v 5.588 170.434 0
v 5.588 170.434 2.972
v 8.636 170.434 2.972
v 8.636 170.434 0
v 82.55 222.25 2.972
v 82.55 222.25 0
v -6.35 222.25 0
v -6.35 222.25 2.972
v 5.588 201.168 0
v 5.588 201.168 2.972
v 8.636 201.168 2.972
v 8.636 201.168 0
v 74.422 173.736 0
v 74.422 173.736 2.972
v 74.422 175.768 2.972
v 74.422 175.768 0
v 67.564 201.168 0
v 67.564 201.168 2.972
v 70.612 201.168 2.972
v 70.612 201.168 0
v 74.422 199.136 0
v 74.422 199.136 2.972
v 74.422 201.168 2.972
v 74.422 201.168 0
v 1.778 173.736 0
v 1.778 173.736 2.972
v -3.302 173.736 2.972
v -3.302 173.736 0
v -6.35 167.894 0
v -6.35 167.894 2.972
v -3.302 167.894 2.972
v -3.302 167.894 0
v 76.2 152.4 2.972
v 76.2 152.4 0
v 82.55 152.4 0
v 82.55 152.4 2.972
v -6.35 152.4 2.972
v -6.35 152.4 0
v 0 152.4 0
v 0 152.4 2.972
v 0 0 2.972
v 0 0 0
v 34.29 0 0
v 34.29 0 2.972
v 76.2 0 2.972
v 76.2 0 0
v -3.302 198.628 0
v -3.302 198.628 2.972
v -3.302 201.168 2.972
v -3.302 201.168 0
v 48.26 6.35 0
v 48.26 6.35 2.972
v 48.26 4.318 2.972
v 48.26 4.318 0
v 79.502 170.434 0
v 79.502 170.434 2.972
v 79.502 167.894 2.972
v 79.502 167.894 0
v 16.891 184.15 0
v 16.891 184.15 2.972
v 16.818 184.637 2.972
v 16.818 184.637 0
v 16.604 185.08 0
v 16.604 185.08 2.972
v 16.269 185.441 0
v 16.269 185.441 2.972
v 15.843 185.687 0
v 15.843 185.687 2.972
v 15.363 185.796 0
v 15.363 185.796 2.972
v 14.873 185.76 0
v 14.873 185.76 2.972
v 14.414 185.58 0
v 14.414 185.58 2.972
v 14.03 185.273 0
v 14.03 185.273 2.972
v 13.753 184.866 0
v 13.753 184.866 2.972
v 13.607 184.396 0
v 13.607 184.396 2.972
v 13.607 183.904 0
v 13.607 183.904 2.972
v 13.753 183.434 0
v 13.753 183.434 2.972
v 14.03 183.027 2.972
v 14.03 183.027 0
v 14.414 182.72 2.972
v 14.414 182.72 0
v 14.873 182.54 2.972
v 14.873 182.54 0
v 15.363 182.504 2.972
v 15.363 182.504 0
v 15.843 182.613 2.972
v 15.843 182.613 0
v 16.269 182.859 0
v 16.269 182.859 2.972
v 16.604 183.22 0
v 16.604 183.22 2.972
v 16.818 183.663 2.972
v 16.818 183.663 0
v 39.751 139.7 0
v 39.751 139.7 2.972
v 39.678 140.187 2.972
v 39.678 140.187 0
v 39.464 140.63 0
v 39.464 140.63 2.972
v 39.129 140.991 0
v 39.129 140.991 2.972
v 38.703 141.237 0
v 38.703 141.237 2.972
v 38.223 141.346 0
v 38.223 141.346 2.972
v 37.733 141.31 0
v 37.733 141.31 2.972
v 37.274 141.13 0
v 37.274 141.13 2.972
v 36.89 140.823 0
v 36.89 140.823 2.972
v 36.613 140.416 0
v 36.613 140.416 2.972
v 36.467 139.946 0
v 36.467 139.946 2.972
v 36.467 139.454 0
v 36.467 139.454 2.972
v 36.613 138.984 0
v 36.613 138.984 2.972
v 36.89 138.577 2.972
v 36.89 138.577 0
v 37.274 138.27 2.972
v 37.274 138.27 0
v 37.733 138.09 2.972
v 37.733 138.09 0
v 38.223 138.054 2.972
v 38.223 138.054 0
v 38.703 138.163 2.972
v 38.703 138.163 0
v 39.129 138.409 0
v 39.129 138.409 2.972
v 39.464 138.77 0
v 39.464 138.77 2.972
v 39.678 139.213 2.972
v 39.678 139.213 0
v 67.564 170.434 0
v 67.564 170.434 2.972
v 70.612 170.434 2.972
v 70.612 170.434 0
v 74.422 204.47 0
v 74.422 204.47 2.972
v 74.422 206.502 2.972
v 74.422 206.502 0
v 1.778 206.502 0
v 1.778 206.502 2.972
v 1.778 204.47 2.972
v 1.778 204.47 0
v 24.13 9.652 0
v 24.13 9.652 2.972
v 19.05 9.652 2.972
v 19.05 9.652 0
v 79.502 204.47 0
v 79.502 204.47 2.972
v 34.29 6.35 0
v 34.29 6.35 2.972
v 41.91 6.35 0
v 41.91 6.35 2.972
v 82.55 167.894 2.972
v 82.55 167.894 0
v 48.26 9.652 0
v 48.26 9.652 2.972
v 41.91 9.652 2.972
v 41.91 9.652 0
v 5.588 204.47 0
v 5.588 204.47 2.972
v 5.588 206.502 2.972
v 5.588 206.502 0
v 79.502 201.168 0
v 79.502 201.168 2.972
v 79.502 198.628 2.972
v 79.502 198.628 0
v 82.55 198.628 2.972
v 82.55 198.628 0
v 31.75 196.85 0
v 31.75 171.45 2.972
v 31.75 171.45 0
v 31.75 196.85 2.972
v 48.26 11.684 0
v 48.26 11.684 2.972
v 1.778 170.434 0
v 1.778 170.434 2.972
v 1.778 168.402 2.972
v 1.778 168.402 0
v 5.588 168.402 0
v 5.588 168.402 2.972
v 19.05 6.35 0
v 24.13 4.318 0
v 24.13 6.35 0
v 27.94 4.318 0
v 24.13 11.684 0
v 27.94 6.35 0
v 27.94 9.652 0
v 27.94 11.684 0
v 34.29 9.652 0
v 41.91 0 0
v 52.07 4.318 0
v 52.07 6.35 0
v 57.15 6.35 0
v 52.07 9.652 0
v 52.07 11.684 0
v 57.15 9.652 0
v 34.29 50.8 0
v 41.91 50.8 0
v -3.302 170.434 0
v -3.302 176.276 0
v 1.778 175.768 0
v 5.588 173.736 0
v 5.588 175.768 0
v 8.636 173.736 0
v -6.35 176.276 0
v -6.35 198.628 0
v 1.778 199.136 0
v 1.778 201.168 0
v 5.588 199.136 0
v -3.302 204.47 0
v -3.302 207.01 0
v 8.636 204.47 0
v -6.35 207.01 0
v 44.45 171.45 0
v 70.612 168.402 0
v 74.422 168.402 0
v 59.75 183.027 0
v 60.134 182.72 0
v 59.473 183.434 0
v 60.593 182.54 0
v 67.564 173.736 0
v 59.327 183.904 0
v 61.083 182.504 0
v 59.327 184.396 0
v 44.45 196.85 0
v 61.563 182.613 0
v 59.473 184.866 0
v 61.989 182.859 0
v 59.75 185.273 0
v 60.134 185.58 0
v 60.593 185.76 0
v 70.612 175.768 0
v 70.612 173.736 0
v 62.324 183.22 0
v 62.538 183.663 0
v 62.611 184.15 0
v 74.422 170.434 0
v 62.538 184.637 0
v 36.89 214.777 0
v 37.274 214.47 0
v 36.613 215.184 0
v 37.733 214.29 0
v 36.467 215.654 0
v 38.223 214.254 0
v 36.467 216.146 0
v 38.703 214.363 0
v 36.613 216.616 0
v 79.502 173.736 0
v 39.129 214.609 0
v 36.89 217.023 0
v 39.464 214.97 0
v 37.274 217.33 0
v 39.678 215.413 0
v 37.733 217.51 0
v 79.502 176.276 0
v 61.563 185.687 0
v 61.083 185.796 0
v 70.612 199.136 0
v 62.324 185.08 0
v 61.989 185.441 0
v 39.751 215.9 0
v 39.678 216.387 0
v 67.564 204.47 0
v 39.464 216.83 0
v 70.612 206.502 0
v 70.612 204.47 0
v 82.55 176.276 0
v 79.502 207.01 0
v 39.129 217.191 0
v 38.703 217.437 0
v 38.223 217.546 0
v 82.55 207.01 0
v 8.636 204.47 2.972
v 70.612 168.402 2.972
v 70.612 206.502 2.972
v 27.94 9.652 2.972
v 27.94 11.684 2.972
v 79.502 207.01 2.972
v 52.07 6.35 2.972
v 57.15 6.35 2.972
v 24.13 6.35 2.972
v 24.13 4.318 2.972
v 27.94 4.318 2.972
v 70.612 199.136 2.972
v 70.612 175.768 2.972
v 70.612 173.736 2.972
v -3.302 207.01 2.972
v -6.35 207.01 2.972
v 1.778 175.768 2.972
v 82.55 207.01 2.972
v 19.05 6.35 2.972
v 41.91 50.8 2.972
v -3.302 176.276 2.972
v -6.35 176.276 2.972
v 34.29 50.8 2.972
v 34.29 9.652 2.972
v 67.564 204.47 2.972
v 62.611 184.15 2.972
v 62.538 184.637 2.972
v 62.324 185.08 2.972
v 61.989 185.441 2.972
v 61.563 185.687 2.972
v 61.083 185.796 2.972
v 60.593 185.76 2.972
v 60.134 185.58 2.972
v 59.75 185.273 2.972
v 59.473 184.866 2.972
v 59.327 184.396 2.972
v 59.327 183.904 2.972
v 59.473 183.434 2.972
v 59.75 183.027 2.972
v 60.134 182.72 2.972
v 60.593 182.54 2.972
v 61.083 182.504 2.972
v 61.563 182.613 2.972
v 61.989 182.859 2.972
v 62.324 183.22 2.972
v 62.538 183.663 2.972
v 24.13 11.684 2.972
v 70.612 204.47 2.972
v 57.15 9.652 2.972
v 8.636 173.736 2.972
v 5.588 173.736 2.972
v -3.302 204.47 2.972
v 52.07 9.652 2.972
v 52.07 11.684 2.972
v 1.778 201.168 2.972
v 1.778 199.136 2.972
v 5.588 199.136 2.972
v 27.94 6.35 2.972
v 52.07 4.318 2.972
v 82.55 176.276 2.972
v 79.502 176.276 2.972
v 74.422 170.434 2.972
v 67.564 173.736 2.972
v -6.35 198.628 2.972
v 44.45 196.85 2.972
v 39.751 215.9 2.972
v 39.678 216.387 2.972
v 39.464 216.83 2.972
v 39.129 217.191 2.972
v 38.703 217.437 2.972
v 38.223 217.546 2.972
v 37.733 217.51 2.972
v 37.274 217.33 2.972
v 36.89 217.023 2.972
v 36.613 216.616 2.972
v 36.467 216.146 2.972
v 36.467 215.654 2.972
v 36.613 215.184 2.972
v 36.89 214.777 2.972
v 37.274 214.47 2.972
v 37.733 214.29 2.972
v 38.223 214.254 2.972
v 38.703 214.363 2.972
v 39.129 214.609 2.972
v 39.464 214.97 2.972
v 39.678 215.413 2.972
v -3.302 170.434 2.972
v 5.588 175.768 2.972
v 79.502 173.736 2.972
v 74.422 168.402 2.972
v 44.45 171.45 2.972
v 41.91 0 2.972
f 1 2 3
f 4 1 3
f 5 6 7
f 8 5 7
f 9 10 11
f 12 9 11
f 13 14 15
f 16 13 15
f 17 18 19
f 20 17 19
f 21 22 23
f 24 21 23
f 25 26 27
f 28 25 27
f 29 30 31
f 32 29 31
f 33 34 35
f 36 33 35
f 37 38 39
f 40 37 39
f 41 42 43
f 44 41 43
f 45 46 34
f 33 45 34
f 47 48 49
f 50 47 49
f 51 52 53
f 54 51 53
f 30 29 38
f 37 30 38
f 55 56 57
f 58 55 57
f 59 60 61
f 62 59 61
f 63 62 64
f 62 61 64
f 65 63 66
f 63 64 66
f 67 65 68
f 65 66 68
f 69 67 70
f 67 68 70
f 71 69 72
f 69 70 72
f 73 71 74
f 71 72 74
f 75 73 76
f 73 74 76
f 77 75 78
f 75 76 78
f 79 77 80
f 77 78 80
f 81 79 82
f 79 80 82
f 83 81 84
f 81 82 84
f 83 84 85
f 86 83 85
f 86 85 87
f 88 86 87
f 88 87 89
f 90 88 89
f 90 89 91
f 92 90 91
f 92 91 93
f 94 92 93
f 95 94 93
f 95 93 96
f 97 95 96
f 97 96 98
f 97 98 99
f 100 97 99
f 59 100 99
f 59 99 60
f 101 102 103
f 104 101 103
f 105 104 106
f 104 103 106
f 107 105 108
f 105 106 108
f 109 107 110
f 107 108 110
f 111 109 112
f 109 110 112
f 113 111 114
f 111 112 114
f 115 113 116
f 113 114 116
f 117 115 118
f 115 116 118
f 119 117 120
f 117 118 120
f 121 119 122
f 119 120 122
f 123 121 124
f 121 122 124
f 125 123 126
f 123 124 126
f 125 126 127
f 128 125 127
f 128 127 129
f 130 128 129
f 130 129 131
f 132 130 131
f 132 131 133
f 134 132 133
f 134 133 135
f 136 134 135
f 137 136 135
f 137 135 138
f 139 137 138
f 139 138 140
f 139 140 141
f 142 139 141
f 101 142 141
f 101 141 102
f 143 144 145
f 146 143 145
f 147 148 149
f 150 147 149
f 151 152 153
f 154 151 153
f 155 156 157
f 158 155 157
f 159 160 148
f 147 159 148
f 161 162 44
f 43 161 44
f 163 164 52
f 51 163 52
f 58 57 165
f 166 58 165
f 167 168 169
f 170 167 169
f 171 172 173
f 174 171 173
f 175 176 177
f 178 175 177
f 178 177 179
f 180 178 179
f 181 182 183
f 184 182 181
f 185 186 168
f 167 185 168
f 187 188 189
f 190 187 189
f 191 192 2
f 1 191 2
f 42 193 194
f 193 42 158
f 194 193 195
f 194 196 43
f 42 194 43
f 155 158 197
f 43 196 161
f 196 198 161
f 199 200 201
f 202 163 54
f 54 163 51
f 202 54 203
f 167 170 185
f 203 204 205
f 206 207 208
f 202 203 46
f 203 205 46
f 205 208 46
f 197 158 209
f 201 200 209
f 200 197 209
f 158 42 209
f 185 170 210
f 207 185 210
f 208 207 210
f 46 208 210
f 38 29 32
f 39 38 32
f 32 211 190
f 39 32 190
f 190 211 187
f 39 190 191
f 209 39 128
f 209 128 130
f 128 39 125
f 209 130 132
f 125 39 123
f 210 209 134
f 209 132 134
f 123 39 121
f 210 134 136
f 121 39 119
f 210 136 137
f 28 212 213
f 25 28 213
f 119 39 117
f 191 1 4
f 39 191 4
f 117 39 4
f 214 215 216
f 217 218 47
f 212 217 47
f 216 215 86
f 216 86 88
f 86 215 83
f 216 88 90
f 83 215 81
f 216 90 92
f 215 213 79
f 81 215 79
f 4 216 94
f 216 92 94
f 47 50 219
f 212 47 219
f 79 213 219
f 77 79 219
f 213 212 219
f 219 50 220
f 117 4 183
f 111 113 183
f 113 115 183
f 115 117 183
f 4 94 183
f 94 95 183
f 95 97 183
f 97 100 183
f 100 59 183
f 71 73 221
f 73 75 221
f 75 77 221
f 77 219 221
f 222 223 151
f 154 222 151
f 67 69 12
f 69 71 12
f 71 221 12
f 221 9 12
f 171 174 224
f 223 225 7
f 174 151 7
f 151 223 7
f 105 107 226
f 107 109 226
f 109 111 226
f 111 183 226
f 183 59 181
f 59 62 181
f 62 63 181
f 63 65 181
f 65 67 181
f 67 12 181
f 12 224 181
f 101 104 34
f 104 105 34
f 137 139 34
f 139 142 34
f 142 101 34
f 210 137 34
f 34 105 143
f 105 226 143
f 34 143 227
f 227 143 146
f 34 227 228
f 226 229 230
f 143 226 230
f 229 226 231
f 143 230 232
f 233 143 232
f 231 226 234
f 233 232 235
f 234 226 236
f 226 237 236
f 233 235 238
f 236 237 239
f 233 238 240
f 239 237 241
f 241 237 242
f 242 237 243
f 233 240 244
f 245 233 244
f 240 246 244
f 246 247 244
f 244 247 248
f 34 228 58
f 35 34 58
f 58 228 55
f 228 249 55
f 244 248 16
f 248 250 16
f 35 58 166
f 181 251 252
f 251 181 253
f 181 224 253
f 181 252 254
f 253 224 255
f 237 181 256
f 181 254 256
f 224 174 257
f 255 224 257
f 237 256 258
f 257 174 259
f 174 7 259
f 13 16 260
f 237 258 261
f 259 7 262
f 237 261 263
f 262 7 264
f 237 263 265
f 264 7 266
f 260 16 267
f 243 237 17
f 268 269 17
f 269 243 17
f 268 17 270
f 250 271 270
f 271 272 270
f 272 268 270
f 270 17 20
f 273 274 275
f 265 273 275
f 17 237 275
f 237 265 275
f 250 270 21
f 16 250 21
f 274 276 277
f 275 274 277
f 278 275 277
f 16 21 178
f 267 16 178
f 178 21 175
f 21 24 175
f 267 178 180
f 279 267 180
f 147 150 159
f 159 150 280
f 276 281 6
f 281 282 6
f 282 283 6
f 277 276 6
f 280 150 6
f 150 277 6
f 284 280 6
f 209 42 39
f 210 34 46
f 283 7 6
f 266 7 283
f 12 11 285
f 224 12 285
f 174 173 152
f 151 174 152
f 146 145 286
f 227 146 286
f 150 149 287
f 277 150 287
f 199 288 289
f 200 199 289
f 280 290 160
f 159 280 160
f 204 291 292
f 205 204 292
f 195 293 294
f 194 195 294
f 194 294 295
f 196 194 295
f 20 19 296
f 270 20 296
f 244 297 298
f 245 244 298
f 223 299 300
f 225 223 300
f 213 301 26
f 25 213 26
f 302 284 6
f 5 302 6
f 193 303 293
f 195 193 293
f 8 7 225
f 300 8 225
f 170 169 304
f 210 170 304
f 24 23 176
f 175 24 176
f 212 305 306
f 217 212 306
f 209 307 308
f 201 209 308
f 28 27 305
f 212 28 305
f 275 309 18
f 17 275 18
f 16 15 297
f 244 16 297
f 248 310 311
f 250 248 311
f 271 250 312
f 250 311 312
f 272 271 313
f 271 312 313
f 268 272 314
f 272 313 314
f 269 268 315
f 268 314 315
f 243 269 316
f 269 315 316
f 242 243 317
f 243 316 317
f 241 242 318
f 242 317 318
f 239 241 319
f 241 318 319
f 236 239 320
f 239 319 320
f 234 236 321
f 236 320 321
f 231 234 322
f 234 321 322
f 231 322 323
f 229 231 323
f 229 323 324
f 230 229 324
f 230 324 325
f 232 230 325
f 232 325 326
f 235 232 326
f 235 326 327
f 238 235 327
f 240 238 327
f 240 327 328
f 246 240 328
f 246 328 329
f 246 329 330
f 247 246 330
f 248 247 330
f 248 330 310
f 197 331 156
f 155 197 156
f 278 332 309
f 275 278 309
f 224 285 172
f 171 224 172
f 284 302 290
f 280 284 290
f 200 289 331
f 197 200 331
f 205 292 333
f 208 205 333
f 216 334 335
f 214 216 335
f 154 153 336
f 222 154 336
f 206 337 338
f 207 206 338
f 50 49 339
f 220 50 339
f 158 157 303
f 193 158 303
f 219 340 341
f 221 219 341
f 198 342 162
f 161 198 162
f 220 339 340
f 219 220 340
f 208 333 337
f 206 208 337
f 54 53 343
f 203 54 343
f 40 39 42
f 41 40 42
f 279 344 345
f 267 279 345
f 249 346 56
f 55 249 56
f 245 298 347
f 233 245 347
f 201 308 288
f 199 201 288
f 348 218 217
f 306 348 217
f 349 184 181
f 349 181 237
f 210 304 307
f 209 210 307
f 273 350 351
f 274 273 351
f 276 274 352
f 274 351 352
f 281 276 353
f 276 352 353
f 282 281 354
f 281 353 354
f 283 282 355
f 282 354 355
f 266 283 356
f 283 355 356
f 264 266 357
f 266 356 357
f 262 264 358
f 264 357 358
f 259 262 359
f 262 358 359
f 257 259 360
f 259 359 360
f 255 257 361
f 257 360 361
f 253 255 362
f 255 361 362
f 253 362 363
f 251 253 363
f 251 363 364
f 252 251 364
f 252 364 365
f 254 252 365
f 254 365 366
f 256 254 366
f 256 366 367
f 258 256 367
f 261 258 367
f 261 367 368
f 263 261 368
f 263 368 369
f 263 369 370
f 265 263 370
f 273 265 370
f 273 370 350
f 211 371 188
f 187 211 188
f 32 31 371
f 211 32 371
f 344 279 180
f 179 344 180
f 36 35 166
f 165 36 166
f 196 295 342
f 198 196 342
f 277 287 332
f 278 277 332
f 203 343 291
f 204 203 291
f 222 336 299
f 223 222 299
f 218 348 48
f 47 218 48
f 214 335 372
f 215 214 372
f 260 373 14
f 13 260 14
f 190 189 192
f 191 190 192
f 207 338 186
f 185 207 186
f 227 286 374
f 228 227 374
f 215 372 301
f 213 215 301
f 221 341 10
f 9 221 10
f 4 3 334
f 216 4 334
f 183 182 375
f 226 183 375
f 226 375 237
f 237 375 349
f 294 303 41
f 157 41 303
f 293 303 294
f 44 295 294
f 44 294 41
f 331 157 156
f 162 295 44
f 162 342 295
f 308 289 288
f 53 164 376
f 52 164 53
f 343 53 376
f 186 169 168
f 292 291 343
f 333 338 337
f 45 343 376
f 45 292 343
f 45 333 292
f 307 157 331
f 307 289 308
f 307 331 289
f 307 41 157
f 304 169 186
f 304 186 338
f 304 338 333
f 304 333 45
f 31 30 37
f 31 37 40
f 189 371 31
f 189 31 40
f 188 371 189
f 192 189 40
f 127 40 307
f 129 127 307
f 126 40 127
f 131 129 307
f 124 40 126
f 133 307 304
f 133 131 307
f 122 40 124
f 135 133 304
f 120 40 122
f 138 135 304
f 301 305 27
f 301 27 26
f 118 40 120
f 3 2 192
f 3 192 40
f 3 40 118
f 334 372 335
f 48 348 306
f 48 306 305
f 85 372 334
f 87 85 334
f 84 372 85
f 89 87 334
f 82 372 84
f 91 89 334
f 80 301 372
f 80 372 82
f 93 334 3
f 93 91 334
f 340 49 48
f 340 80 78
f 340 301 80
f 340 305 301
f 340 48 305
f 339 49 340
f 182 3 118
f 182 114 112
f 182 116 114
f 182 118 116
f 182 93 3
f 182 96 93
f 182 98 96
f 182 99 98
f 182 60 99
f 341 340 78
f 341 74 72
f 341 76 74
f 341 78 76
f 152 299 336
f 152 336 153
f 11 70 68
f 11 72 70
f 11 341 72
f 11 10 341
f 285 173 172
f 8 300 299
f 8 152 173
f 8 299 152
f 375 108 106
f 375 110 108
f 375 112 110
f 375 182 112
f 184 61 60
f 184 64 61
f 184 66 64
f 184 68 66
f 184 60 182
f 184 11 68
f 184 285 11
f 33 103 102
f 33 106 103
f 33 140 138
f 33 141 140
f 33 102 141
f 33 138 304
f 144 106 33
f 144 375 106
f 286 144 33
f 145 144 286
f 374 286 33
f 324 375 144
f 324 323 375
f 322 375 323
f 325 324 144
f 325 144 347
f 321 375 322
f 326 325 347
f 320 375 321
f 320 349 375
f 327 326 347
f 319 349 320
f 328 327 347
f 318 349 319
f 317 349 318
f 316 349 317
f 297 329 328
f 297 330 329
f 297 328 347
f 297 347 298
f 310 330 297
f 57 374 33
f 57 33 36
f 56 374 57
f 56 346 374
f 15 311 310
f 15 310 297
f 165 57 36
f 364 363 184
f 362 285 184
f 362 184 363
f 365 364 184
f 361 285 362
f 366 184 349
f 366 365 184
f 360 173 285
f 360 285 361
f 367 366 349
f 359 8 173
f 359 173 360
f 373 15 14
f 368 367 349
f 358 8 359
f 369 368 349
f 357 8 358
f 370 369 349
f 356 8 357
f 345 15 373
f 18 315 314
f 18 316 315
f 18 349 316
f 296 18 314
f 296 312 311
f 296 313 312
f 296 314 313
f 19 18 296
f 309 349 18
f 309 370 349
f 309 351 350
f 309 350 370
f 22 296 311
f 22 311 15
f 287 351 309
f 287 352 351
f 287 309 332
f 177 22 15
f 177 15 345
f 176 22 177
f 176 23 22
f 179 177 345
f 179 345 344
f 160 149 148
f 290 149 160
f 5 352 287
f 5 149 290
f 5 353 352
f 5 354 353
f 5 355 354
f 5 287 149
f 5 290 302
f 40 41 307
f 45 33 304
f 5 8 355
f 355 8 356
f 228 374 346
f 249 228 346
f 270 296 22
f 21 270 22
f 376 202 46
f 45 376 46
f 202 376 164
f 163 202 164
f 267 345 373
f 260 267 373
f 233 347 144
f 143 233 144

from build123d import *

# Parameters (mm, degrees)
F1_DEPTH = 2.9718
F2_R     = 1.651
F2_W     = 12.7
F2_H     = 25.4
F3_DEPTH = 2.9728


with BuildPart() as f1:
    # F0 (on Top) → F1 (new body)
    with BuildSketch(Plane.XY):
        Polygon((0, 152.4), (0, 0), (76.2, 0), (76.2, 152.4), (82.55, 152.4), (82.55, 222.25), (76.2, 222.25), (0, 222.25), (-6.35, 222.25), (-6.35, 152.4), align=None)
    extrude(amount=F1_DEPTH)

    # F2 (on face) → F3 (cut, through all)
    with BuildSketch(Plane.XY.offset(2.9718)):
        with Locations((38.1, 215.9)):
            Circle(F2_R)
        with Locations((60.96, 184.15)):
            Circle(F2_R)
        with Locations((15.24, 184.15)):
            Circle(F2_R)
        with Locations((38.1, 184.15)):
            Rectangle(F2_W, F2_H)
        Polygon((34.29, 6.35), (34.29, 0), (41.91, 0), (41.91, 6.35), (48.26, 6.35), (48.26, 4.318), (52.07, 4.318), (52.07, 6.35), (57.15, 6.35), (57.15, 9.652), (52.07, 9.652), (52.07, 11.684), (48.26, 11.684), (48.26, 9.652), (41.91, 9.652), (41.91, 50.8), (34.29, 50.8), (34.29, 9.652), (27.94, 9.652), (27.94, 11.684), (24.13, 11.684), (24.13, 9.652), (19.05, 9.652), (19.05, 6.35), (24.13, 6.35), (24.13, 4.318), (27.94, 4.318), (27.94, 6.35), align=None)
        with Locations((101.6, 63.5)):
            Circle(F2_R)
        Polygon((-3.302, 176.275976), (-6.35, 176.275976), (-6.35, 167.893976), (-3.302, 167.893976), (-3.302, 170.433976), (1.778, 170.433976), (1.778, 168.401976), (5.588, 168.401976), (5.588, 170.433976), (8.636, 170.433976), (8.636, 173.735976), (5.588, 173.735976), (5.588, 175.767976), (1.778, 175.767976), (1.778, 173.735976), (-3.302, 173.735976), align=None)
        Polygon((-3.302002, 207.009976), (-6.350002, 207.009976), (-6.350002, 198.627976), (-3.302002, 198.627976), (-3.302002, 201.167976), (1.777998, 201.167976), (1.777998, 199.135976), (5.587998, 199.135976), (5.587998, 201.167976), (8.635998, 201.167976), (8.635998, 204.469976), (5.587998, 204.469976), (5.587998, 206.501976), (1.777998, 206.501976), (1.777998, 204.469976), (-3.302002, 204.469976), align=None)
        Polygon((79.502, 198.627971), (82.55, 198.627971), (82.55, 207.009971), (79.502, 207.009971), (79.502, 204.469971), (74.422, 204.469971), (74.422, 206.501971), (70.612, 206.501971), (70.612, 204.469971), (67.564, 204.469971), (67.564, 201.167971), (70.612, 201.167971), (70.612, 199.135971), (74.422, 199.135971), (74.422, 201.167971), (79.502, 201.167971), align=None)
        Polygon((79.502002, 167.893971), (82.550002, 167.893971), (82.550002, 176.275971), (79.502002, 176.275971), (79.502002, 173.735971), (74.422002, 173.735971), (74.422002, 175.767971), (70.612002, 175.767971), (70.612002, 173.735971), (67.564002, 173.735971), (67.564002, 170.433971), (70.612002, 170.433971), (70.612002, 168.401971), (74.422002, 168.401971), (74.422002, 170.433971), (79.502002, 170.433971), align=None)
        with Locations((38.1, 139.7)):
            Circle(F2_R)
    extrude(amount=-F3_DEPTH, mode=Mode.SUBTRACT)


solid = f1.part
